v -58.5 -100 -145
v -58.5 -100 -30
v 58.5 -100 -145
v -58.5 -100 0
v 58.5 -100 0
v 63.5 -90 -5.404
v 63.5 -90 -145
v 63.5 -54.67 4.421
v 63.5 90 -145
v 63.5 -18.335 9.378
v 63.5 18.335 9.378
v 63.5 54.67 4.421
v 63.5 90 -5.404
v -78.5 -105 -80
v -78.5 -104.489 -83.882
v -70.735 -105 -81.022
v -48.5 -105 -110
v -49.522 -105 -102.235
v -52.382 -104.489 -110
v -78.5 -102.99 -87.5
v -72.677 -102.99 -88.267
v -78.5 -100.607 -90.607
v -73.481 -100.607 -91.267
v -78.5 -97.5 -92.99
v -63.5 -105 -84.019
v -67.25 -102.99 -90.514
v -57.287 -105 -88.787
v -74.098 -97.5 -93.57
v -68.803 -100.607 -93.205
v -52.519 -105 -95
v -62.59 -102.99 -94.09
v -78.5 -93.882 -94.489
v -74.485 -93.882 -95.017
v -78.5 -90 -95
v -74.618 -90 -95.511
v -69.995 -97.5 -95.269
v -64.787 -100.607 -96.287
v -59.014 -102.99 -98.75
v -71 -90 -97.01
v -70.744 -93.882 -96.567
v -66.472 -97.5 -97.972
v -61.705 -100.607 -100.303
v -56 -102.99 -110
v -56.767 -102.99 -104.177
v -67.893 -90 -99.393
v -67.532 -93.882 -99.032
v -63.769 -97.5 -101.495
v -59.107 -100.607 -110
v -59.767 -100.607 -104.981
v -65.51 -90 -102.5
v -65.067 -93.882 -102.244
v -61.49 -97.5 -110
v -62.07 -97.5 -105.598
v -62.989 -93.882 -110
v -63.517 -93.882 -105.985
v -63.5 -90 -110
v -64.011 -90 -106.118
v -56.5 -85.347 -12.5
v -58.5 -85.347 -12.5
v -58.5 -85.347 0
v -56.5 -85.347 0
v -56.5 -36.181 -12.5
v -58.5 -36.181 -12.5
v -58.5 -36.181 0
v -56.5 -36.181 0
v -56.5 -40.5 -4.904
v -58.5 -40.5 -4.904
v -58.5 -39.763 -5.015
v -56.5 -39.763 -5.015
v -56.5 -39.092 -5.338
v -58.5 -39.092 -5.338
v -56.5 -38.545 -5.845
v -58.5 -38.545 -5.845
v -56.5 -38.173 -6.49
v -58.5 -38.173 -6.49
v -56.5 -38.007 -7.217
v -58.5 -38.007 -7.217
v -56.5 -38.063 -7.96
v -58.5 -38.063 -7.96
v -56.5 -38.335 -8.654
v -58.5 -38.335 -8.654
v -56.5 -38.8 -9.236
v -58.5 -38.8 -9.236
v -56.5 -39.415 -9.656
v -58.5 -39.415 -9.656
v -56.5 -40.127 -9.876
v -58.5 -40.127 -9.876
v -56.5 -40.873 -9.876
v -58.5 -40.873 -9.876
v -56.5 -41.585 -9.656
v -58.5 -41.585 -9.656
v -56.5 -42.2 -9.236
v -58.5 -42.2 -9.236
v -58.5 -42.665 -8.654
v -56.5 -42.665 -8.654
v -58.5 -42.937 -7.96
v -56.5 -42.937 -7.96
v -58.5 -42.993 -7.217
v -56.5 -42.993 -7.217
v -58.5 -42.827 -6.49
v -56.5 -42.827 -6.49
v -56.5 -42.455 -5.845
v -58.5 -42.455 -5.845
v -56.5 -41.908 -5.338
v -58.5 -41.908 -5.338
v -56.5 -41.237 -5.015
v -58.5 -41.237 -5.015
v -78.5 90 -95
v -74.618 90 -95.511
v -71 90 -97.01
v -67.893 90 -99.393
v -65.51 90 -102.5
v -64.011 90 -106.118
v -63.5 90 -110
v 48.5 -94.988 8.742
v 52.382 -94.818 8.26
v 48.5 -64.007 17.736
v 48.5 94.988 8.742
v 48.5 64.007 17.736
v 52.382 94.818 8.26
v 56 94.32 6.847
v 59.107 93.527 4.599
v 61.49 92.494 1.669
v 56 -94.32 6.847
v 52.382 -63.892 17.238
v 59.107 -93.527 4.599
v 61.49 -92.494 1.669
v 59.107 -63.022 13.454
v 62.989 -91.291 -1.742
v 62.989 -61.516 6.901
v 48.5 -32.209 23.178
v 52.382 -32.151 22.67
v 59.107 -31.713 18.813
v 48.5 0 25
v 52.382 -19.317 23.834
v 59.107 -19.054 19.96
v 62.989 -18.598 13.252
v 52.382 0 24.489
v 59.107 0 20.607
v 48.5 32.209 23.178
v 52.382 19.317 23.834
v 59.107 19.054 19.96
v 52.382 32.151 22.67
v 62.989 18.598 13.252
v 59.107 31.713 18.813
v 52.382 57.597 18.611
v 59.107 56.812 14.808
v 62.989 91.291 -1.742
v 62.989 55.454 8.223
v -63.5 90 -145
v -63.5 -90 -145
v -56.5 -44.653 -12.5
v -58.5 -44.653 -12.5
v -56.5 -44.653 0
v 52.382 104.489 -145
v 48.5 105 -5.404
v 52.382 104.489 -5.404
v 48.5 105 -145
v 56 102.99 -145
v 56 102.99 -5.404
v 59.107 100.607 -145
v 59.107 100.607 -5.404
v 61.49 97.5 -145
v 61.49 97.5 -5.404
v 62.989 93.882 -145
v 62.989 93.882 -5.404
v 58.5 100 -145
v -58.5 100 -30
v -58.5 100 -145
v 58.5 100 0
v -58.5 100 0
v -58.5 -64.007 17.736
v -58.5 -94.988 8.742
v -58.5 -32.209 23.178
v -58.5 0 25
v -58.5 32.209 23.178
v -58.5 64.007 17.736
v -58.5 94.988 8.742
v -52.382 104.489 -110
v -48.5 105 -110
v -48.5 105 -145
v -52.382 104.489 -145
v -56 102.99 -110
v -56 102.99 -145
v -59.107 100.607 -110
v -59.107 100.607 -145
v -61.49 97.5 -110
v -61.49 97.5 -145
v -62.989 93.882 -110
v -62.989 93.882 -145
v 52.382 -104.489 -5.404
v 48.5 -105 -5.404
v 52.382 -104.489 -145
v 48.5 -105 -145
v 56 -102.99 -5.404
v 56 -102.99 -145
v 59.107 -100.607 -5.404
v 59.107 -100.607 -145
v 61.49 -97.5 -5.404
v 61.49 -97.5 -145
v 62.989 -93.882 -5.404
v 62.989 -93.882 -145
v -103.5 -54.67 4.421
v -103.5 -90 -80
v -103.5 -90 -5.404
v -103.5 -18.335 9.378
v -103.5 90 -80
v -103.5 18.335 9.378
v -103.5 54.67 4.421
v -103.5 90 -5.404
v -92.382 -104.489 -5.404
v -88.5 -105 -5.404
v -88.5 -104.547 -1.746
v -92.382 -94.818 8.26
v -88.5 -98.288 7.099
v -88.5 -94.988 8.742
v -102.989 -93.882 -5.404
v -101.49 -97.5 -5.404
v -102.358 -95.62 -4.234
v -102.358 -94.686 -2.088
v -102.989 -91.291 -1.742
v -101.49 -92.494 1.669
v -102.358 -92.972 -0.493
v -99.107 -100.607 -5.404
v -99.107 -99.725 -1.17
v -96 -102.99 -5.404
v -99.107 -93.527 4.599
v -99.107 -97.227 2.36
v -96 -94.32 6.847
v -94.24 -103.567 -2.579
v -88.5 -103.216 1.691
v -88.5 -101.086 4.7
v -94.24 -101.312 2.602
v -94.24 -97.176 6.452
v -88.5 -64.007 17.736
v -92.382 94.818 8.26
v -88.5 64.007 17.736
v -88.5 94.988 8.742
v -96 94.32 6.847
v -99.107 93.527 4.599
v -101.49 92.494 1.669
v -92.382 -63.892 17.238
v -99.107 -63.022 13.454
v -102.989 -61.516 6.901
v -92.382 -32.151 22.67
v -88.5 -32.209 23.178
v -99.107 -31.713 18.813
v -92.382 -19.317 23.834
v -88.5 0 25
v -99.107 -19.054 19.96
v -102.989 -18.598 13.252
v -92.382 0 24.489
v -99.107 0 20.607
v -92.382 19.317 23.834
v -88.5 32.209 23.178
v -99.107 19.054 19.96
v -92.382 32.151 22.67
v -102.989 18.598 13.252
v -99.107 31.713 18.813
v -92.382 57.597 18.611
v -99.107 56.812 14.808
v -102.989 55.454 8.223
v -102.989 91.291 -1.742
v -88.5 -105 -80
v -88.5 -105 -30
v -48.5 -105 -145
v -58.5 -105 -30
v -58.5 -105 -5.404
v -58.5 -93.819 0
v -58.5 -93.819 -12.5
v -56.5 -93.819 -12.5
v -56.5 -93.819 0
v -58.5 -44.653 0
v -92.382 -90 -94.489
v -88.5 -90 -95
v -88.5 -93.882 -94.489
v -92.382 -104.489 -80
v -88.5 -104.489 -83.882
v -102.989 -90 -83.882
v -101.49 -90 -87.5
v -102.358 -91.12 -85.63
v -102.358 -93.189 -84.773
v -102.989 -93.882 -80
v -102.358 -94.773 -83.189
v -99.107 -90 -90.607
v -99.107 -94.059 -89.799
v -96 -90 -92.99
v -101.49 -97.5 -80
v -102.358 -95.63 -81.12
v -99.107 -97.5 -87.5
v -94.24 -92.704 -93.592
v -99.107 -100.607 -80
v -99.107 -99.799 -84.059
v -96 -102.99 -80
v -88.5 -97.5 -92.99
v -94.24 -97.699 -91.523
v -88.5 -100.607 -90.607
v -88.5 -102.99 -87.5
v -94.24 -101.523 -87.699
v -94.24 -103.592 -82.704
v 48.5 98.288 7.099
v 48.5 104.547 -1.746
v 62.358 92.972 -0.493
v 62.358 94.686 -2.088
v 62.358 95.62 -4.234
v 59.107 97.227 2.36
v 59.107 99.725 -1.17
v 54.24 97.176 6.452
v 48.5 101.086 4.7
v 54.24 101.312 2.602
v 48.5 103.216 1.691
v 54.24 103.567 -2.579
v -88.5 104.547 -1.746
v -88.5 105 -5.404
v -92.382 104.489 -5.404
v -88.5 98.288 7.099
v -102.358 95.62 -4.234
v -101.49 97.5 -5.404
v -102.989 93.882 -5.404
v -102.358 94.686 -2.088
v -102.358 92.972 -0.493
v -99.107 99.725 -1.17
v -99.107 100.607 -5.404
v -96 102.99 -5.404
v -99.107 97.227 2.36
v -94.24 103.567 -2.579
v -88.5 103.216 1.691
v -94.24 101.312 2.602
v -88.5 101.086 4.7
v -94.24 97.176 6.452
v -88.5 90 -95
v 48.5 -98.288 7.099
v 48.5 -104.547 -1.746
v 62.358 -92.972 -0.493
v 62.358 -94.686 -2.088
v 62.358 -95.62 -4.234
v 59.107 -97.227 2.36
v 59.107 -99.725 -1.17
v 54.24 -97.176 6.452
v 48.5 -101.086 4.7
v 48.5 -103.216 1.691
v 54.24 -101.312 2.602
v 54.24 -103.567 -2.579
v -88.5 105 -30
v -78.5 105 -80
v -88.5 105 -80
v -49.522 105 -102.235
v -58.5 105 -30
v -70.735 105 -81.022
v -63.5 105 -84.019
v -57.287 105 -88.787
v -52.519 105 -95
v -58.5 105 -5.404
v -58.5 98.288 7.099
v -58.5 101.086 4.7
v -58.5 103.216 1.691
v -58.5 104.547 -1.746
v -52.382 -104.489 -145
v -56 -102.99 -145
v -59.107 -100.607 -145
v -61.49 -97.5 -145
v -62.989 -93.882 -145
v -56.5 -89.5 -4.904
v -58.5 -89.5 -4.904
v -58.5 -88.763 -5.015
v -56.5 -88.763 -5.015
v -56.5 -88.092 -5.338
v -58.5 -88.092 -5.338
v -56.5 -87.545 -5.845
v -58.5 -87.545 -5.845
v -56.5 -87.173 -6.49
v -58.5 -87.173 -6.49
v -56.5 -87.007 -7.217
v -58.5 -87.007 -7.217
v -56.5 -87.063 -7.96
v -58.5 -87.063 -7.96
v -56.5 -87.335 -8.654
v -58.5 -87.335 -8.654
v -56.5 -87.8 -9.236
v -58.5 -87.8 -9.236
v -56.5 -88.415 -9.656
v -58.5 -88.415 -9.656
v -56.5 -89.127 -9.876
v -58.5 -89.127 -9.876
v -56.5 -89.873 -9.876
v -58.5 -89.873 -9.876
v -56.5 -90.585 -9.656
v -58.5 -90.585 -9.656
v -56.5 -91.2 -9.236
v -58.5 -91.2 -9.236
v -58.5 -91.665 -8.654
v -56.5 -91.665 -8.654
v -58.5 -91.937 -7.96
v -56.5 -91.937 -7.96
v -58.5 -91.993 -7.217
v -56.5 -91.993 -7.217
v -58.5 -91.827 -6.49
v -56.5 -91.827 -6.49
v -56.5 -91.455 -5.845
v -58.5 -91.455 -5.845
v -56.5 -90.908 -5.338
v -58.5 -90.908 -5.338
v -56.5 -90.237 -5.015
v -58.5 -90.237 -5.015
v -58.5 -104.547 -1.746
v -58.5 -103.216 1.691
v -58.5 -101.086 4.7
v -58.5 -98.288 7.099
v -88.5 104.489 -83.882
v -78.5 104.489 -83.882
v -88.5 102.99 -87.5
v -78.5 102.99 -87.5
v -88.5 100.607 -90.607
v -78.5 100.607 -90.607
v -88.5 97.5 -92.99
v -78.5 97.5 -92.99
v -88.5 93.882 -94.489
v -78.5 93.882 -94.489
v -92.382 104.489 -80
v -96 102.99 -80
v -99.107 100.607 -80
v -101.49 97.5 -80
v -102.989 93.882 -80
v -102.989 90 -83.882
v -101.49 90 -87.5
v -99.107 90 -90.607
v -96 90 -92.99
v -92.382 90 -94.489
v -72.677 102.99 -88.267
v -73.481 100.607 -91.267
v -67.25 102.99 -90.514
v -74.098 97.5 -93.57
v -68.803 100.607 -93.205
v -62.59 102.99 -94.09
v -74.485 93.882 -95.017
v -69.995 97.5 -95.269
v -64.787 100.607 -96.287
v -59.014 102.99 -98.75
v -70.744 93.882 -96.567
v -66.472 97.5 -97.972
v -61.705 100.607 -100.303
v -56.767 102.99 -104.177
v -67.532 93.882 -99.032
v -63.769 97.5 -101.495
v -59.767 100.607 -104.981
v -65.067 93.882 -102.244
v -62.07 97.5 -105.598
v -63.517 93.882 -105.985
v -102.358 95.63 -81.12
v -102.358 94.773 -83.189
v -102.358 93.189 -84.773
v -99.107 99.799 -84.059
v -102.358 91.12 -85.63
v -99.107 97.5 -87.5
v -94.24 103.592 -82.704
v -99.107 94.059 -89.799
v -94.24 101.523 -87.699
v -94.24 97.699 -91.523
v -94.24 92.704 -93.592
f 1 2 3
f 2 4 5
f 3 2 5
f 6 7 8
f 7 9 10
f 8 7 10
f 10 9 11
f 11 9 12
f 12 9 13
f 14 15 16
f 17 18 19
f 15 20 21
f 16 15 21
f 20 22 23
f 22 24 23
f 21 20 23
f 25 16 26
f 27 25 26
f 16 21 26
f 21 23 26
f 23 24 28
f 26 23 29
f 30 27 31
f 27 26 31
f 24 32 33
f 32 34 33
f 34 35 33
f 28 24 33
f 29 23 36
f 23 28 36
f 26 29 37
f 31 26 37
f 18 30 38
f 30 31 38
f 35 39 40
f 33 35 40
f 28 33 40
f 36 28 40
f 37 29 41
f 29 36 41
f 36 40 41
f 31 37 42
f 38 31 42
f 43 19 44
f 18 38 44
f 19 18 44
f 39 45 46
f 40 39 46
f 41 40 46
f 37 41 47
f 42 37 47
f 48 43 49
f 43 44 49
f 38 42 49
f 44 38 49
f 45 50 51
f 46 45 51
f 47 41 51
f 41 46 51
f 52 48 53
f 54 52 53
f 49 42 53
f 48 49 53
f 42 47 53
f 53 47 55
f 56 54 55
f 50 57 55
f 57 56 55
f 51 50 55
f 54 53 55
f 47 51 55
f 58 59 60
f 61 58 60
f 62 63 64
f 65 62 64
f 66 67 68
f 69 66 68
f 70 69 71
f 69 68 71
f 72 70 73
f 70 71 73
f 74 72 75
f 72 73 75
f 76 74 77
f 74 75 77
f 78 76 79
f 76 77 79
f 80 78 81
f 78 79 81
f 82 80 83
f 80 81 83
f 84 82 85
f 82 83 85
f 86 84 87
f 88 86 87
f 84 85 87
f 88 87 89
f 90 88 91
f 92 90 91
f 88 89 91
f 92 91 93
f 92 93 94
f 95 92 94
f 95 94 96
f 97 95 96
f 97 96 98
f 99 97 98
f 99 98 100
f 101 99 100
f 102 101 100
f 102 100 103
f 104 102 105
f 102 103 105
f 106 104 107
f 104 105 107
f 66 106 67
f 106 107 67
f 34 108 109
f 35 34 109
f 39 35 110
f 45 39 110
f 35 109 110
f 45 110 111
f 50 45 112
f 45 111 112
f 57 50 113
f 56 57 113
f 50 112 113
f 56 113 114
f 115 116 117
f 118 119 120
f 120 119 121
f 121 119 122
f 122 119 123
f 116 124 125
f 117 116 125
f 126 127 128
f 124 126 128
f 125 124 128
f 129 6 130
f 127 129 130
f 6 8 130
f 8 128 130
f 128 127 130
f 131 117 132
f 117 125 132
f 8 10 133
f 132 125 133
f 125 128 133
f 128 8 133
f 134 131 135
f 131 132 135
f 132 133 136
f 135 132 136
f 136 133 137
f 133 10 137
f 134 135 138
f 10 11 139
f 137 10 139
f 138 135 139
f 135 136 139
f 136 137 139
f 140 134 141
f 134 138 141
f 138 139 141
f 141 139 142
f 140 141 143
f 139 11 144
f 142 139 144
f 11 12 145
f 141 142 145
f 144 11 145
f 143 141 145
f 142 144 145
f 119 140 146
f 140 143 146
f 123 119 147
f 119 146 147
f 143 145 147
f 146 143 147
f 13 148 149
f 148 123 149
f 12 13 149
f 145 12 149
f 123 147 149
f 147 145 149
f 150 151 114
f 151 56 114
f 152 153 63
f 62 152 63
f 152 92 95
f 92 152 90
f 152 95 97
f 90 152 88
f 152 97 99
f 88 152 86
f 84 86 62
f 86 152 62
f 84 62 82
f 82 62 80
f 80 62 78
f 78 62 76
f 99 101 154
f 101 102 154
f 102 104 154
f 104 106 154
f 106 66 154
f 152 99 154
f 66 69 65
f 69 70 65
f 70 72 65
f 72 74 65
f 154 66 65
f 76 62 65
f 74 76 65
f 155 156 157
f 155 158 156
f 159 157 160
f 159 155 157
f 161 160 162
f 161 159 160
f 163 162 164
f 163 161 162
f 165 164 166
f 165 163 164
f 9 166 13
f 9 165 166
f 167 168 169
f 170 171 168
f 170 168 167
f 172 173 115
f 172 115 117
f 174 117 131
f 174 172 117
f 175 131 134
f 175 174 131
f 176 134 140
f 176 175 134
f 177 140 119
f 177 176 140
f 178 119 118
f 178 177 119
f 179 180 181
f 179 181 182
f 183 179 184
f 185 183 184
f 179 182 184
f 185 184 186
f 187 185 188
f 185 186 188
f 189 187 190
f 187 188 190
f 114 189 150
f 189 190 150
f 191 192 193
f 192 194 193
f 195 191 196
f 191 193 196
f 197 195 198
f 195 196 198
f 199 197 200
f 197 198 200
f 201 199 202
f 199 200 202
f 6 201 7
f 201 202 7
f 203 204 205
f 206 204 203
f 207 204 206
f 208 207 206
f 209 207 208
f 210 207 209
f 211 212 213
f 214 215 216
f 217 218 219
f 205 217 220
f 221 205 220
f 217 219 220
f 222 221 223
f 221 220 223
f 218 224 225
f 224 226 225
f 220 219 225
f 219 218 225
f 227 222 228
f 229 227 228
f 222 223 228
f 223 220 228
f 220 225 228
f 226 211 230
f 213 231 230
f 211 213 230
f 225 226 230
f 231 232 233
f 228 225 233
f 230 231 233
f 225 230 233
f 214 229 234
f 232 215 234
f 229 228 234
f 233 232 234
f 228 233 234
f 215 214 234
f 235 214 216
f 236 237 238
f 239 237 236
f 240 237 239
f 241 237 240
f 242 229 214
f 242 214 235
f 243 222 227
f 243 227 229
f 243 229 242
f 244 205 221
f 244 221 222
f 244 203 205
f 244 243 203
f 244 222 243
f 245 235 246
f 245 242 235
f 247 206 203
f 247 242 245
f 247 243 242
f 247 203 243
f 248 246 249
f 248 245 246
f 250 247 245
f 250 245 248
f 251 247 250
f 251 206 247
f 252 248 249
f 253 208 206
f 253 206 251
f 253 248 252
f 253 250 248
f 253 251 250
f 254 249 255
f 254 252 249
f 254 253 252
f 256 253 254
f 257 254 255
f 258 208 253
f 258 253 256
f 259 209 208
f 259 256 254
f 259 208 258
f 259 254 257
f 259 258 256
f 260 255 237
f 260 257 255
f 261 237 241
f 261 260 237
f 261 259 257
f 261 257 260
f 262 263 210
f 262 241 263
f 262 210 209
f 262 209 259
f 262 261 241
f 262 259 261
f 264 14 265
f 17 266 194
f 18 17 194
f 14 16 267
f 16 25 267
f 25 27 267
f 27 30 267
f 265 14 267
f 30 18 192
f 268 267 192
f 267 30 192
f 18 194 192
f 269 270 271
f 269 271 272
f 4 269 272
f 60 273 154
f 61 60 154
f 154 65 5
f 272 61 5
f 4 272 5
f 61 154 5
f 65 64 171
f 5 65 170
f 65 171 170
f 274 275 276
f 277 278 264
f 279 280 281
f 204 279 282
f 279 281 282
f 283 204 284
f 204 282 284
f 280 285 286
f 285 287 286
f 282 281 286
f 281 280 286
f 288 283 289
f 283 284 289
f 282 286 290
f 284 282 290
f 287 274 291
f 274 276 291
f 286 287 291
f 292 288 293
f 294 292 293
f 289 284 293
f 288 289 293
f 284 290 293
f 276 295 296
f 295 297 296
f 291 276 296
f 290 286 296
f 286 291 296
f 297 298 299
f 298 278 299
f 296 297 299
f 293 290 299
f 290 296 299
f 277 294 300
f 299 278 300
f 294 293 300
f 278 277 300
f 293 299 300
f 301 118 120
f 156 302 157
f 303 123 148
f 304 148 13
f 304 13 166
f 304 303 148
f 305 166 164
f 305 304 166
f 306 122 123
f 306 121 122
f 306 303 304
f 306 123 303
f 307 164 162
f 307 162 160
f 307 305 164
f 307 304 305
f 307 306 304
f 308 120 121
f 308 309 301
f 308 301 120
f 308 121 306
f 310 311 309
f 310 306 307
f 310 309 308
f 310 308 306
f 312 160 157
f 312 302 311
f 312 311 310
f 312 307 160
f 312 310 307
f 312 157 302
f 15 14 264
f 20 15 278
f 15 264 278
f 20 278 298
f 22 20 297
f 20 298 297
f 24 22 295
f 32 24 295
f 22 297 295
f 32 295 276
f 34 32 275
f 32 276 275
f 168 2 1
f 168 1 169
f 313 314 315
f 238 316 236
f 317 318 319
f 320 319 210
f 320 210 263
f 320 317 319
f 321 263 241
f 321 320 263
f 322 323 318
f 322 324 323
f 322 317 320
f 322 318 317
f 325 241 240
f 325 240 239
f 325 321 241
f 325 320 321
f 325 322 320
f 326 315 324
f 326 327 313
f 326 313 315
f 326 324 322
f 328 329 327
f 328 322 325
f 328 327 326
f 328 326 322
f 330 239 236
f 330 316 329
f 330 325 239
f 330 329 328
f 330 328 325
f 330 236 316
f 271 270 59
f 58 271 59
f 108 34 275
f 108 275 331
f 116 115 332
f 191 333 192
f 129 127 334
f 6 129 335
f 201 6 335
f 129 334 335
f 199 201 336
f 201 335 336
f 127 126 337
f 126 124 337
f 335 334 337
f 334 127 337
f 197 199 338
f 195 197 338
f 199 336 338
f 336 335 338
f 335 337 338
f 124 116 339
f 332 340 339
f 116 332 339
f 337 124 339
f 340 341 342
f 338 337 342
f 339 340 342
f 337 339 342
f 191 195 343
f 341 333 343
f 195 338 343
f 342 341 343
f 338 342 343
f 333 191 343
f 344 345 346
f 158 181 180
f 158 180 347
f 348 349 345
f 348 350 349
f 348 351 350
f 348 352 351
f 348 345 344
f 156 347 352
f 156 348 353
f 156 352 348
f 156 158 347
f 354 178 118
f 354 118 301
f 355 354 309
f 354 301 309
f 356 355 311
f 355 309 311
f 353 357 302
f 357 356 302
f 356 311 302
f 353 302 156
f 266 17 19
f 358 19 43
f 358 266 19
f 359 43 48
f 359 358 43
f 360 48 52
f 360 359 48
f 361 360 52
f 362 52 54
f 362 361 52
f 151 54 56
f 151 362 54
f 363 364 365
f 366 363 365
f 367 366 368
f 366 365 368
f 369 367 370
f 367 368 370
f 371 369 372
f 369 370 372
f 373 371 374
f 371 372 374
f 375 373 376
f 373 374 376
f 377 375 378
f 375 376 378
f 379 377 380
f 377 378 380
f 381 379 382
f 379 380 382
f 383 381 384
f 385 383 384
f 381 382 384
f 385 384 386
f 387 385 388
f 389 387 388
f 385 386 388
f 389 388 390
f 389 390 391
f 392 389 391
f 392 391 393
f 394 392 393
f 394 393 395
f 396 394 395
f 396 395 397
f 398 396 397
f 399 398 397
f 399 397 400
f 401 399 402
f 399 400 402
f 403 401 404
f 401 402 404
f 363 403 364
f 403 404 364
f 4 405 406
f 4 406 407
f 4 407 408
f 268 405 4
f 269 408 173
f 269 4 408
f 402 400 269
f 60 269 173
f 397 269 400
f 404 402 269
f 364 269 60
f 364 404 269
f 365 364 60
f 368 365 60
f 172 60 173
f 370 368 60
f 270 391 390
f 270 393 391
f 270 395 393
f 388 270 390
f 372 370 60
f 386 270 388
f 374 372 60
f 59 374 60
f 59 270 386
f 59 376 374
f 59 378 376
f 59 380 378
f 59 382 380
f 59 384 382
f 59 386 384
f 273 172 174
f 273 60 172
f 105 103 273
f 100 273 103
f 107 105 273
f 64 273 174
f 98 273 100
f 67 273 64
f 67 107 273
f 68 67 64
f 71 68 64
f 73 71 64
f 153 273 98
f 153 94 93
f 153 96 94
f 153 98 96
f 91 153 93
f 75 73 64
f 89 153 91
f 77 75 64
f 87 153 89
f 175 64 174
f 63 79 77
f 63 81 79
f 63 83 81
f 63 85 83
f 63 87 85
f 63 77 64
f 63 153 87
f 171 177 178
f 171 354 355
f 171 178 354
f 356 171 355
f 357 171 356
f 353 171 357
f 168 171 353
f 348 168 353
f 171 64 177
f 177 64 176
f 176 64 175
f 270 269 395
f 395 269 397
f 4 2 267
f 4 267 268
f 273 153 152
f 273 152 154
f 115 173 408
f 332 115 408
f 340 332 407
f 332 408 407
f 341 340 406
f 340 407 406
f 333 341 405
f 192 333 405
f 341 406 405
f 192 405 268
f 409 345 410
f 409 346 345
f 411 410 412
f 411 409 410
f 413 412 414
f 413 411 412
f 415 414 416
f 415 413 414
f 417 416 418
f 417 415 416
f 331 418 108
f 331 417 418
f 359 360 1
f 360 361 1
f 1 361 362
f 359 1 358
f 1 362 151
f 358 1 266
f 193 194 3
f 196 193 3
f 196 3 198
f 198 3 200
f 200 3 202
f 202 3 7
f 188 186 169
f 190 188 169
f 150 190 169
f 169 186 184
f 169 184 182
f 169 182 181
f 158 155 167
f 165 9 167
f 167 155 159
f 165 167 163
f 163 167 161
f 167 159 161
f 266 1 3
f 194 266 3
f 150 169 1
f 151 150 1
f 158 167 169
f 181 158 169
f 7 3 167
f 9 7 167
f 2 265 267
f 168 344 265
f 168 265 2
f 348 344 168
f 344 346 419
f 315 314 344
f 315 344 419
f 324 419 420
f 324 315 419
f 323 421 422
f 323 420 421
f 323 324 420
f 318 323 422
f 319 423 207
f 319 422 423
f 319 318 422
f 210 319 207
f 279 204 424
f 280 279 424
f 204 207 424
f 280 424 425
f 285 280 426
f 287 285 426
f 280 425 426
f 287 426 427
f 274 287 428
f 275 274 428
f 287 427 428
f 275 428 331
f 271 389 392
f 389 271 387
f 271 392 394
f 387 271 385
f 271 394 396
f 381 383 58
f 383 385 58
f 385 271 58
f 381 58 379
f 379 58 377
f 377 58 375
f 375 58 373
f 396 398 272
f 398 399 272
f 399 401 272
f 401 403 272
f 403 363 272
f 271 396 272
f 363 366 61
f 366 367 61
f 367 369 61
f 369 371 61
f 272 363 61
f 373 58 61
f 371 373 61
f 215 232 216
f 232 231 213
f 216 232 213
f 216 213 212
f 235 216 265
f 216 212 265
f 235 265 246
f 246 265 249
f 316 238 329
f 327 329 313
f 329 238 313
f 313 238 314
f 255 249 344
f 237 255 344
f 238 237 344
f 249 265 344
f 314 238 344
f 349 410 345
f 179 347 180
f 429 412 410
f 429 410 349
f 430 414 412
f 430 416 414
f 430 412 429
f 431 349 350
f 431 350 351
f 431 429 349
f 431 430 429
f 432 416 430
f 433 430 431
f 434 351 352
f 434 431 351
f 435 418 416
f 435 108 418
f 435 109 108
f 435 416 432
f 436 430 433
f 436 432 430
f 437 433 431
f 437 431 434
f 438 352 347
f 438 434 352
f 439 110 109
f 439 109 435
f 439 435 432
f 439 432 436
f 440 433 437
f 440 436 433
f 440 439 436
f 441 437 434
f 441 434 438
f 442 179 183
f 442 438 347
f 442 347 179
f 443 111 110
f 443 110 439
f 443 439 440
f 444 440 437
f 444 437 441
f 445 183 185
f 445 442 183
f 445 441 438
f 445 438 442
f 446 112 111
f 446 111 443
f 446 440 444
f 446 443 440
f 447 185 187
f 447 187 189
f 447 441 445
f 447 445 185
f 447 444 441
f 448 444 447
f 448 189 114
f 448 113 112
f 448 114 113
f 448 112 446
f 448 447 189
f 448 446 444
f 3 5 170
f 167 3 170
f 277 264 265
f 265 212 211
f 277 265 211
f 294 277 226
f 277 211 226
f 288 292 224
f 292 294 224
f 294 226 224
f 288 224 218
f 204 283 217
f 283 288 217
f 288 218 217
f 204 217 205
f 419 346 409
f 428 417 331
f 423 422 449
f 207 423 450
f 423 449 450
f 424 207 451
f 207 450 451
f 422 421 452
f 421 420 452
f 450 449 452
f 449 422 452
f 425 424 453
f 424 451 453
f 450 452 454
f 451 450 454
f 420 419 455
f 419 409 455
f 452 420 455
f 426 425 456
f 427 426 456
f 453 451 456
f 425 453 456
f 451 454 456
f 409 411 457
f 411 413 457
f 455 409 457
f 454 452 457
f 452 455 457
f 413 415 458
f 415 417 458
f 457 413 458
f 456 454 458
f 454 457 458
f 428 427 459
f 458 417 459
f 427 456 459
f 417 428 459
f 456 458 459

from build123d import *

# Parameters (mm, degrees)
CROQUIS1_W                 = 117
CROQUIS1_H                 = 200
SALIENTE_EXTRUIR1_DEPTH    = 5
CROQUIS2_W                 = 127
CROQUIS2_H                 = 210
CROQUIS2_W_2               = 117
CROQUIS2_H_2               = 200
SALIENTE_EXTRUIR2_DEPTH    = 150
CROQUIS3_W                 = 100
CROQUIS3_H                 = 210
SALIENTE_EXTRUIR3_DEPTH    = 40
SALIENTE_EXTRUIR4_DEPTH    = 167
REDONDEO1_R                = 15
CORTAR_EXTRUIR1_DEPTH      = 207.790352773
CORTAR_EXTRUIR1_DEPTH_BACK = 30
CROQUIS5_W                 = 30
CROQUIS5_H                 = 210
CROQUIS6_W                 = 12.5
CROQUIS6_H                 = 8.471901852
CROQUIS6_R                 = 2.5
SALIENTE_EXTRUIR6_DEPTH    = 2


with BuildPart() as part:
    # Croquis1 → Saliente-Extruir1 (new body)
    with BuildSketch(Plane.XY):
        Rectangle(CROQUIS1_W, CROQUIS1_H)
    extrude(amount=SALIENTE_EXTRUIR1_DEPTH)

    # Croquis2 → Saliente-Extruir2 (add)
    with BuildSketch(Plane.XY.offset(5)):
        Rectangle(CROQUIS2_W, CROQUIS2_H)
        Rectangle(CROQUIS2_W_2, CROQUIS2_H_2, mode=Mode.SUBTRACT)
    extrude(amount=-SALIENTE_EXTRUIR2_DEPTH)

    # Croquis3 → Saliente-Extruir3 (add)
    with BuildSketch(Plane.ZY.offset(63.5)):
        with Locations((-45, 0)):
            Rectangle(CROQUIS3_W, CROQUIS3_H)
    extrude(amount=SALIENTE_EXTRUIR3_DEPTH)

    # Croquis4 → Saliente-Extruir4 (add)
    with BuildSketch(Plane.ZY.offset(103.5)):
        with BuildLine():
            Line((5, 105), (5, -105))
            ThreePointArc((5, -105), (25, 0), (5, 105))
        make_face()
    extrude(amount=-SALIENTE_EXTRUIR4_DEPTH)

    # Redondeo1
    redondeo1_edges = [part.edges().sort_by_distance(p)[0] for p in [
        (63.5, 105, -70),
        (63.5, -105, -70),
        (-63.5, -105, -120),
        (-63.5, 105, -120),
        (-20, 105, 5),
        (-20, -105, 5),
        (-63.5, 0, -95),
        (-83.5, 105, -95),
        (-83.5, -105, -95),
        (-103.5, 105, -45),
        (-103.5, 0, -95),
        (-103.5, -105, -45),
        (-103.5, 0, 25),
        (63.5, 0, 25),
    ]]
    fillet(redondeo1_edges, radius=REDONDEO1_R)

    # Croquis5 → Cortar-Extruir1 (cut, two sides: drawn at the far end of the back side and taken through both)
    with BuildSketch(Plane.XY.offset(-CORTAR_EXTRUIR1_DEPTH_BACK)):
        with Locations((-73.5, 0)):
            Rectangle(CROQUIS5_W, CROQUIS5_H)
    extrude(amount=CORTAR_EXTRUIR1_DEPTH + CORTAR_EXTRUIR1_DEPTH_BACK, mode=Mode.SUBTRACT)

    # Croquis6 → Saliente-Extruir6 (add)
    # profile 1 of 2: a face of its own
    with BuildSketch(Plane.ZY.offset(58.5)):
        with Locations((-6.25, -40.416867006)):
            Rectangle(CROQUIS6_W, CROQUIS6_H)
        with Locations((-7.403741824, -40.5)):
            Circle(CROQUIS6_R, mode=Mode.SUBTRACT)
    # profile 2 of 2: a face of its own
    with BuildSketch(Plane.ZY.offset(58.5)):
        with Locations((-6.25, -89.583132994)):
            Rectangle(CROQUIS6_W, CROQUIS6_H)
        with Locations((-7.403741824, -89.5)):
            Circle(CROQUIS6_R, mode=Mode.SUBTRACT)
    extrude(amount=-SALIENTE_EXTRUIR6_DEPTH)


solid = part.part
